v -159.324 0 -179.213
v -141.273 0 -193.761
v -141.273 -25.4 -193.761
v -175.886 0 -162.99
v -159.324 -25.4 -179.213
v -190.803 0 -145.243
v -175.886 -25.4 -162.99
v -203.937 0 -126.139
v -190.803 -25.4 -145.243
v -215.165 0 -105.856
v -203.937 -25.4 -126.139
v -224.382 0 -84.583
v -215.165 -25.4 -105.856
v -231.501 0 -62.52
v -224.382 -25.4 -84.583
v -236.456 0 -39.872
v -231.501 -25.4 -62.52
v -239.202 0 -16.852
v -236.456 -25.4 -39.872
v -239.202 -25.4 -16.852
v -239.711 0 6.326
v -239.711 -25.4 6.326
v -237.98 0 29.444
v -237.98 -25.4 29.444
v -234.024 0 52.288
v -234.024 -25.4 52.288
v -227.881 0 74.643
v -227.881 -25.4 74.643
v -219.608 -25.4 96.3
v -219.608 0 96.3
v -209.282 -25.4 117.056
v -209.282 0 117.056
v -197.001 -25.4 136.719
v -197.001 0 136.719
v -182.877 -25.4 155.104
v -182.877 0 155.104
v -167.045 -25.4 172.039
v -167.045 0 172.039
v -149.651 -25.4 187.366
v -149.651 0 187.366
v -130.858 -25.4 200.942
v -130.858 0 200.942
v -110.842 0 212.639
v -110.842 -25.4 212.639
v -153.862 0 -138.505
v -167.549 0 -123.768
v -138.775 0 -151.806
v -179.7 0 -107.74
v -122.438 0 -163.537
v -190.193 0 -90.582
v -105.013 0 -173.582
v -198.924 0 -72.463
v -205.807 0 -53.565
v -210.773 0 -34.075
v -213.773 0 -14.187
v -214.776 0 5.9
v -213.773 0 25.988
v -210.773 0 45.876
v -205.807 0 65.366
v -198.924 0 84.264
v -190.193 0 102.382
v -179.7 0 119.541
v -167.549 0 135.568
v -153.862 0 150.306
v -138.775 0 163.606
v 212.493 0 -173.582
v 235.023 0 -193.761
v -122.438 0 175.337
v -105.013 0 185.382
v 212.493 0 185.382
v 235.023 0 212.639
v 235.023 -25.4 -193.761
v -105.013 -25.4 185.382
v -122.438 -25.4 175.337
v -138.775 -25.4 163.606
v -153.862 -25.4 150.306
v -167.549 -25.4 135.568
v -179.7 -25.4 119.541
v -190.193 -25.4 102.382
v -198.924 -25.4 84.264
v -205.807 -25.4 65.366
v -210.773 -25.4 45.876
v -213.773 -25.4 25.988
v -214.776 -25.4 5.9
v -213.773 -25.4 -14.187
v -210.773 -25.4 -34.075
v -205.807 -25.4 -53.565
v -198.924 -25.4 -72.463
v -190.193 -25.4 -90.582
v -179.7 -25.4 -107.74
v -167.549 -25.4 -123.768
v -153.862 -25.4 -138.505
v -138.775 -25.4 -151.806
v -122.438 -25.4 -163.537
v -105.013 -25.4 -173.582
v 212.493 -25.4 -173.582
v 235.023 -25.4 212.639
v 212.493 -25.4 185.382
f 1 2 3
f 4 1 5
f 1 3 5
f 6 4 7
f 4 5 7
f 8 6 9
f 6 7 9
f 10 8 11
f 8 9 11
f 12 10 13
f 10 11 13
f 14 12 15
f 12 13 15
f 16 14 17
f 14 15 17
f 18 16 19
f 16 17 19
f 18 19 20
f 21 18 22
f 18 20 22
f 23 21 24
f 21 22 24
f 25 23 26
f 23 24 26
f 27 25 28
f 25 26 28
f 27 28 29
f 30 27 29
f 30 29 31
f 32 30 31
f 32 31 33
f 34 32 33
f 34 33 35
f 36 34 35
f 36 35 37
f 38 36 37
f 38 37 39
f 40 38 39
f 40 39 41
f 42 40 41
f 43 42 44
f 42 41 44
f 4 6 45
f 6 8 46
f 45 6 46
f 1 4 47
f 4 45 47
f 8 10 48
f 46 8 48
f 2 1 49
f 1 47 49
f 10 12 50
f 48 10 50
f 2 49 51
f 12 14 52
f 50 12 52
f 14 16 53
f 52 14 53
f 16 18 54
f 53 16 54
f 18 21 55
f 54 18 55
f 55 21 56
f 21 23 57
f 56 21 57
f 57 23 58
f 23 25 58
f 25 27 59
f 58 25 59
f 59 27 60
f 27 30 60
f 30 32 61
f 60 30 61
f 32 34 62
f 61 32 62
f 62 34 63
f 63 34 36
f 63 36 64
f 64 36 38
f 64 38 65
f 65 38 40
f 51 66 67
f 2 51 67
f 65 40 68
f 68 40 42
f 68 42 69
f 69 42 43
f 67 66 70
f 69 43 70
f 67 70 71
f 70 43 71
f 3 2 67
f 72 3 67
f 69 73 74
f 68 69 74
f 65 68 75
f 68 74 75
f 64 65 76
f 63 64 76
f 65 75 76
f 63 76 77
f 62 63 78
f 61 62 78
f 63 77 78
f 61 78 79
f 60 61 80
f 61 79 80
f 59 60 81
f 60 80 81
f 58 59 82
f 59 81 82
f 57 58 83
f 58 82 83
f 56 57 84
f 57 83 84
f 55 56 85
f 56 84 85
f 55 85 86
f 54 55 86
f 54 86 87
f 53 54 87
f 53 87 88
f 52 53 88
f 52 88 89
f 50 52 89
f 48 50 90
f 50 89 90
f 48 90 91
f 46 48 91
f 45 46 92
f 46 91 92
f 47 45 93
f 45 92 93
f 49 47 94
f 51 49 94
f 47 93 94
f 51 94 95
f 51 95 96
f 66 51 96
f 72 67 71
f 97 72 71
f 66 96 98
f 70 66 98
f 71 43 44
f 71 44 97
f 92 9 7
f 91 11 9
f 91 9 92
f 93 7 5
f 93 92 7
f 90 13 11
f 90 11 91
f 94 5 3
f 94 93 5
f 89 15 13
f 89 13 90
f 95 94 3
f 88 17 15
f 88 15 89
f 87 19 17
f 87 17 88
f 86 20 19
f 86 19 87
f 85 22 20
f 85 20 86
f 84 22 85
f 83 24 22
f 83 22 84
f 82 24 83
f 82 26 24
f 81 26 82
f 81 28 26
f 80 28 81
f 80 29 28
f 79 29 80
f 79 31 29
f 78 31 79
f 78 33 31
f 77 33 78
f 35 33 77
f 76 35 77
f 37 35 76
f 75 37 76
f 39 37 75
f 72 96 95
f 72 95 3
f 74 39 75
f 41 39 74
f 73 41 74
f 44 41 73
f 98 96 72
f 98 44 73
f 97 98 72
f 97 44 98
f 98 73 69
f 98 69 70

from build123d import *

# Parameters (mm, degrees)
F0_W     = 474.8173340189
F0_H     = 406.4
F1_DEPTH = 25.4
F3_DEPTH = 25.4
F4_W     = 317.5059556961
F4_H     = 358.9637875557
F5_DEPTH = 25.4
F7_DEPTH = 25.4


with BuildPart() as f1:
    # F0 (on Front) → F1 (new body)
    with BuildSketch(Plane.XZ):
        with Locations((-2.3857876658, 9.4393342733)):
            Rectangle(F0_W, F0_H)
    extrude(amount=F1_DEPTH)

    # F2 (on face) → F3 (cut)
    with BuildSketch(Plane.XZ.offset(25.4)):
        with BuildLine():
            ThreePointArc((-239.7944546753, -5.535e-07), (-205.0373357652, 124.3425568152), (-110.841752119, 212.6393342733))
            Line((-110.841752119, 212.6393342733), (-239.7944546753, 212.6393342733))
            Line((-239.7944546753, 212.6393342733), (-239.7944546753, -5.535e-07))
        make_face()
        with BuildLine():
            Line((-239.7944546753, -193.7606657267), (-141.273440215, -193.7606657267))
            ThreePointArc((-141.273440215, -193.7606657267), (-213.7498163066, -108.6848495509), (-239.7944546753, -5.535e-07))
            Line((-239.7944546753, -5.535e-07), (-239.7944546753, -193.7606657267))
        make_face()
    extrude(amount=-F3_DEPTH, mode=Mode.SUBTRACT)

    # F4 (on face) → F5 (cut)
    with BuildSketch(Plane.XZ.offset(25.4)):
        with Locations((53.7397265434, 5.900233984)):
            Rectangle(F4_W, F4_H)
    extrude(amount=-F5_DEPTH, mode=Mode.SUBTRACT)

    # F6 (on face) → F7 (cut)
    with BuildSketch(Plane.XZ.offset(25.4)):
        with BuildLine():
            Line((-105.0132513046, -173.5816597939), (-105.0132513046, 185.3821277618))
            ThreePointArc((-105.0132513046, 185.3821277618), (-214.776070383, 5.900233984), (-105.0132513046, -173.5816597939))
        make_face()
    extrude(amount=-F7_DEPTH, mode=Mode.SUBTRACT)


solid = f1.part
